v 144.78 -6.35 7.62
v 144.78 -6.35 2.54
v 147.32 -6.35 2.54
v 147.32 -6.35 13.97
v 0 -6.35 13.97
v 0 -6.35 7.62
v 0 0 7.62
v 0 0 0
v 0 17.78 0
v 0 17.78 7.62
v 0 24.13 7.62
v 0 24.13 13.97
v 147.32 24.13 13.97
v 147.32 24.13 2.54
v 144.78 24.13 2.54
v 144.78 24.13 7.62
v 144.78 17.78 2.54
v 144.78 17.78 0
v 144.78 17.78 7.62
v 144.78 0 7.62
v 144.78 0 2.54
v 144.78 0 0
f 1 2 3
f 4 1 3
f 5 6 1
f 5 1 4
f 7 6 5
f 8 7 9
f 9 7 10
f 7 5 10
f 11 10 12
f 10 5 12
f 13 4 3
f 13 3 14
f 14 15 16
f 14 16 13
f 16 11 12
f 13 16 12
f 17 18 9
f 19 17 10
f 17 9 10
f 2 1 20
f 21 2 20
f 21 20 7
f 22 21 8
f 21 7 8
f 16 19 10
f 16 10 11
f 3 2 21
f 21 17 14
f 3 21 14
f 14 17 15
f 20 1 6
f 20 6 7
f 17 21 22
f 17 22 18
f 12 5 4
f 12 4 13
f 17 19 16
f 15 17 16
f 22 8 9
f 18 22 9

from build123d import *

# Parameters (mm, degrees)
BOSS_EXTRUDE1_DEPTH = 144.78
SKETCH2_W           = 30.48
SKETCH2_H           = 11.43
BOSS_EXTRUDE2_DEPTH = 2.54


with BuildPart() as part:
    # Sketch1 → Boss-Extrude1 (new body)
    with BuildSketch(Plane.YZ):
        Polygon((0, 0), (17.78, 0), (17.78, 7.62), (24.13, 7.62), (24.13, 13.97), (17.78, 13.97), (0, 13.97), (-6.35, 13.97), (-6.35, 7.62), (0, 7.62), align=None)
    extrude(amount=BOSS_EXTRUDE1_DEPTH)

    # Sketch2 → Boss-Extrude2 (add)
    with BuildSketch(Plane.YZ.offset(144.78)):
        with Locations((8.89, 8.255)):
            Rectangle(SKETCH2_W, SKETCH2_H)
    extrude(amount=BOSS_EXTRUDE2_DEPTH)


solid = part.part
